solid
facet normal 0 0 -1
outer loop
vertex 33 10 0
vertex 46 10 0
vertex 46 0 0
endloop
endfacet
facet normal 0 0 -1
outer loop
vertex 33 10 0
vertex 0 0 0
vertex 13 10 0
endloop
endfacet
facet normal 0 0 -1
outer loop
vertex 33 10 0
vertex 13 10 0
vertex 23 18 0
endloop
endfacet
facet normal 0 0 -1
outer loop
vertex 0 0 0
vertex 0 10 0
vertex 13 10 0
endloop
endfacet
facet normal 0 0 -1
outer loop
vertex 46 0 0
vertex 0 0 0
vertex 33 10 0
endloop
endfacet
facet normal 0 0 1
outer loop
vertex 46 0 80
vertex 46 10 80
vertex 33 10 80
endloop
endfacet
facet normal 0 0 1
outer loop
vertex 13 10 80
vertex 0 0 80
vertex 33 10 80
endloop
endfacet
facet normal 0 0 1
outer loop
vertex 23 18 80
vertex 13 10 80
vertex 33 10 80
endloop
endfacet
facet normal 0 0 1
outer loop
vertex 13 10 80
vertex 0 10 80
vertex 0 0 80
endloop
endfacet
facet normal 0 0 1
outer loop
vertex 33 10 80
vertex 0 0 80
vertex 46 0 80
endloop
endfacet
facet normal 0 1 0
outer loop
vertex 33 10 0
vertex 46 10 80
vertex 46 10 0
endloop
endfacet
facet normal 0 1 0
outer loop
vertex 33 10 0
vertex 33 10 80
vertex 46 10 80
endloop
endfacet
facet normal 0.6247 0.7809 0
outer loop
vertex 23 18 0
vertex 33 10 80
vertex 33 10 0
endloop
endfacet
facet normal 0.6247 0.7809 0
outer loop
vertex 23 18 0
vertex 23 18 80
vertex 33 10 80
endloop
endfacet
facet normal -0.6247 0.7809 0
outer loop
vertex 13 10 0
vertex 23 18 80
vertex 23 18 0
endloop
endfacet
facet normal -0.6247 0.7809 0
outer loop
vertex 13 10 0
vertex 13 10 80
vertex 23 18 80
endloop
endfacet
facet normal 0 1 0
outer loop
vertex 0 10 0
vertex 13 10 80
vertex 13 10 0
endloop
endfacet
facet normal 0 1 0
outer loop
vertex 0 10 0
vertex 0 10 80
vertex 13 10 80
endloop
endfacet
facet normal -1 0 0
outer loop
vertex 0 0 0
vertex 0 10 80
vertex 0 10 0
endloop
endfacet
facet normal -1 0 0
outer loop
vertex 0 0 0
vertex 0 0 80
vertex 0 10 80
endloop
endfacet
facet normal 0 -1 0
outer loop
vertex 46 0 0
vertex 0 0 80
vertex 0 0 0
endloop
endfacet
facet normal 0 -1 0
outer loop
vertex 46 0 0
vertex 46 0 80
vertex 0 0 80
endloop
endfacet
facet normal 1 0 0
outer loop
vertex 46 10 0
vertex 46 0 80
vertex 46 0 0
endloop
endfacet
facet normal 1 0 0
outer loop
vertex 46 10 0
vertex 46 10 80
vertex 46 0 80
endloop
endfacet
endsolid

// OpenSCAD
$fn = 32;

// ----------------------------------------------------------------------
// V guide rail: vrib, 46 mm wide
// ----------------------------------------------------------------------

// --- parameters (mm) ---
rail_w = 46;              // rail width, X
base_t = 10;              // base plate thickness
v_depth = 8;              // V feature depth / height
v_half_w = 10;            // half width of the V at the base face
plate_t = 80;             // rail length, Z (the extrusion height)

profile = [[0, 0], [46, 0], [46, 10], [33, 10], [23, 18], [13, 10], [0, 10]];  // primary outline, 7 points, counter clockwise

// --- the one profile operation ---
linear_extrude(height = plate_t) polygon(points = profile);
